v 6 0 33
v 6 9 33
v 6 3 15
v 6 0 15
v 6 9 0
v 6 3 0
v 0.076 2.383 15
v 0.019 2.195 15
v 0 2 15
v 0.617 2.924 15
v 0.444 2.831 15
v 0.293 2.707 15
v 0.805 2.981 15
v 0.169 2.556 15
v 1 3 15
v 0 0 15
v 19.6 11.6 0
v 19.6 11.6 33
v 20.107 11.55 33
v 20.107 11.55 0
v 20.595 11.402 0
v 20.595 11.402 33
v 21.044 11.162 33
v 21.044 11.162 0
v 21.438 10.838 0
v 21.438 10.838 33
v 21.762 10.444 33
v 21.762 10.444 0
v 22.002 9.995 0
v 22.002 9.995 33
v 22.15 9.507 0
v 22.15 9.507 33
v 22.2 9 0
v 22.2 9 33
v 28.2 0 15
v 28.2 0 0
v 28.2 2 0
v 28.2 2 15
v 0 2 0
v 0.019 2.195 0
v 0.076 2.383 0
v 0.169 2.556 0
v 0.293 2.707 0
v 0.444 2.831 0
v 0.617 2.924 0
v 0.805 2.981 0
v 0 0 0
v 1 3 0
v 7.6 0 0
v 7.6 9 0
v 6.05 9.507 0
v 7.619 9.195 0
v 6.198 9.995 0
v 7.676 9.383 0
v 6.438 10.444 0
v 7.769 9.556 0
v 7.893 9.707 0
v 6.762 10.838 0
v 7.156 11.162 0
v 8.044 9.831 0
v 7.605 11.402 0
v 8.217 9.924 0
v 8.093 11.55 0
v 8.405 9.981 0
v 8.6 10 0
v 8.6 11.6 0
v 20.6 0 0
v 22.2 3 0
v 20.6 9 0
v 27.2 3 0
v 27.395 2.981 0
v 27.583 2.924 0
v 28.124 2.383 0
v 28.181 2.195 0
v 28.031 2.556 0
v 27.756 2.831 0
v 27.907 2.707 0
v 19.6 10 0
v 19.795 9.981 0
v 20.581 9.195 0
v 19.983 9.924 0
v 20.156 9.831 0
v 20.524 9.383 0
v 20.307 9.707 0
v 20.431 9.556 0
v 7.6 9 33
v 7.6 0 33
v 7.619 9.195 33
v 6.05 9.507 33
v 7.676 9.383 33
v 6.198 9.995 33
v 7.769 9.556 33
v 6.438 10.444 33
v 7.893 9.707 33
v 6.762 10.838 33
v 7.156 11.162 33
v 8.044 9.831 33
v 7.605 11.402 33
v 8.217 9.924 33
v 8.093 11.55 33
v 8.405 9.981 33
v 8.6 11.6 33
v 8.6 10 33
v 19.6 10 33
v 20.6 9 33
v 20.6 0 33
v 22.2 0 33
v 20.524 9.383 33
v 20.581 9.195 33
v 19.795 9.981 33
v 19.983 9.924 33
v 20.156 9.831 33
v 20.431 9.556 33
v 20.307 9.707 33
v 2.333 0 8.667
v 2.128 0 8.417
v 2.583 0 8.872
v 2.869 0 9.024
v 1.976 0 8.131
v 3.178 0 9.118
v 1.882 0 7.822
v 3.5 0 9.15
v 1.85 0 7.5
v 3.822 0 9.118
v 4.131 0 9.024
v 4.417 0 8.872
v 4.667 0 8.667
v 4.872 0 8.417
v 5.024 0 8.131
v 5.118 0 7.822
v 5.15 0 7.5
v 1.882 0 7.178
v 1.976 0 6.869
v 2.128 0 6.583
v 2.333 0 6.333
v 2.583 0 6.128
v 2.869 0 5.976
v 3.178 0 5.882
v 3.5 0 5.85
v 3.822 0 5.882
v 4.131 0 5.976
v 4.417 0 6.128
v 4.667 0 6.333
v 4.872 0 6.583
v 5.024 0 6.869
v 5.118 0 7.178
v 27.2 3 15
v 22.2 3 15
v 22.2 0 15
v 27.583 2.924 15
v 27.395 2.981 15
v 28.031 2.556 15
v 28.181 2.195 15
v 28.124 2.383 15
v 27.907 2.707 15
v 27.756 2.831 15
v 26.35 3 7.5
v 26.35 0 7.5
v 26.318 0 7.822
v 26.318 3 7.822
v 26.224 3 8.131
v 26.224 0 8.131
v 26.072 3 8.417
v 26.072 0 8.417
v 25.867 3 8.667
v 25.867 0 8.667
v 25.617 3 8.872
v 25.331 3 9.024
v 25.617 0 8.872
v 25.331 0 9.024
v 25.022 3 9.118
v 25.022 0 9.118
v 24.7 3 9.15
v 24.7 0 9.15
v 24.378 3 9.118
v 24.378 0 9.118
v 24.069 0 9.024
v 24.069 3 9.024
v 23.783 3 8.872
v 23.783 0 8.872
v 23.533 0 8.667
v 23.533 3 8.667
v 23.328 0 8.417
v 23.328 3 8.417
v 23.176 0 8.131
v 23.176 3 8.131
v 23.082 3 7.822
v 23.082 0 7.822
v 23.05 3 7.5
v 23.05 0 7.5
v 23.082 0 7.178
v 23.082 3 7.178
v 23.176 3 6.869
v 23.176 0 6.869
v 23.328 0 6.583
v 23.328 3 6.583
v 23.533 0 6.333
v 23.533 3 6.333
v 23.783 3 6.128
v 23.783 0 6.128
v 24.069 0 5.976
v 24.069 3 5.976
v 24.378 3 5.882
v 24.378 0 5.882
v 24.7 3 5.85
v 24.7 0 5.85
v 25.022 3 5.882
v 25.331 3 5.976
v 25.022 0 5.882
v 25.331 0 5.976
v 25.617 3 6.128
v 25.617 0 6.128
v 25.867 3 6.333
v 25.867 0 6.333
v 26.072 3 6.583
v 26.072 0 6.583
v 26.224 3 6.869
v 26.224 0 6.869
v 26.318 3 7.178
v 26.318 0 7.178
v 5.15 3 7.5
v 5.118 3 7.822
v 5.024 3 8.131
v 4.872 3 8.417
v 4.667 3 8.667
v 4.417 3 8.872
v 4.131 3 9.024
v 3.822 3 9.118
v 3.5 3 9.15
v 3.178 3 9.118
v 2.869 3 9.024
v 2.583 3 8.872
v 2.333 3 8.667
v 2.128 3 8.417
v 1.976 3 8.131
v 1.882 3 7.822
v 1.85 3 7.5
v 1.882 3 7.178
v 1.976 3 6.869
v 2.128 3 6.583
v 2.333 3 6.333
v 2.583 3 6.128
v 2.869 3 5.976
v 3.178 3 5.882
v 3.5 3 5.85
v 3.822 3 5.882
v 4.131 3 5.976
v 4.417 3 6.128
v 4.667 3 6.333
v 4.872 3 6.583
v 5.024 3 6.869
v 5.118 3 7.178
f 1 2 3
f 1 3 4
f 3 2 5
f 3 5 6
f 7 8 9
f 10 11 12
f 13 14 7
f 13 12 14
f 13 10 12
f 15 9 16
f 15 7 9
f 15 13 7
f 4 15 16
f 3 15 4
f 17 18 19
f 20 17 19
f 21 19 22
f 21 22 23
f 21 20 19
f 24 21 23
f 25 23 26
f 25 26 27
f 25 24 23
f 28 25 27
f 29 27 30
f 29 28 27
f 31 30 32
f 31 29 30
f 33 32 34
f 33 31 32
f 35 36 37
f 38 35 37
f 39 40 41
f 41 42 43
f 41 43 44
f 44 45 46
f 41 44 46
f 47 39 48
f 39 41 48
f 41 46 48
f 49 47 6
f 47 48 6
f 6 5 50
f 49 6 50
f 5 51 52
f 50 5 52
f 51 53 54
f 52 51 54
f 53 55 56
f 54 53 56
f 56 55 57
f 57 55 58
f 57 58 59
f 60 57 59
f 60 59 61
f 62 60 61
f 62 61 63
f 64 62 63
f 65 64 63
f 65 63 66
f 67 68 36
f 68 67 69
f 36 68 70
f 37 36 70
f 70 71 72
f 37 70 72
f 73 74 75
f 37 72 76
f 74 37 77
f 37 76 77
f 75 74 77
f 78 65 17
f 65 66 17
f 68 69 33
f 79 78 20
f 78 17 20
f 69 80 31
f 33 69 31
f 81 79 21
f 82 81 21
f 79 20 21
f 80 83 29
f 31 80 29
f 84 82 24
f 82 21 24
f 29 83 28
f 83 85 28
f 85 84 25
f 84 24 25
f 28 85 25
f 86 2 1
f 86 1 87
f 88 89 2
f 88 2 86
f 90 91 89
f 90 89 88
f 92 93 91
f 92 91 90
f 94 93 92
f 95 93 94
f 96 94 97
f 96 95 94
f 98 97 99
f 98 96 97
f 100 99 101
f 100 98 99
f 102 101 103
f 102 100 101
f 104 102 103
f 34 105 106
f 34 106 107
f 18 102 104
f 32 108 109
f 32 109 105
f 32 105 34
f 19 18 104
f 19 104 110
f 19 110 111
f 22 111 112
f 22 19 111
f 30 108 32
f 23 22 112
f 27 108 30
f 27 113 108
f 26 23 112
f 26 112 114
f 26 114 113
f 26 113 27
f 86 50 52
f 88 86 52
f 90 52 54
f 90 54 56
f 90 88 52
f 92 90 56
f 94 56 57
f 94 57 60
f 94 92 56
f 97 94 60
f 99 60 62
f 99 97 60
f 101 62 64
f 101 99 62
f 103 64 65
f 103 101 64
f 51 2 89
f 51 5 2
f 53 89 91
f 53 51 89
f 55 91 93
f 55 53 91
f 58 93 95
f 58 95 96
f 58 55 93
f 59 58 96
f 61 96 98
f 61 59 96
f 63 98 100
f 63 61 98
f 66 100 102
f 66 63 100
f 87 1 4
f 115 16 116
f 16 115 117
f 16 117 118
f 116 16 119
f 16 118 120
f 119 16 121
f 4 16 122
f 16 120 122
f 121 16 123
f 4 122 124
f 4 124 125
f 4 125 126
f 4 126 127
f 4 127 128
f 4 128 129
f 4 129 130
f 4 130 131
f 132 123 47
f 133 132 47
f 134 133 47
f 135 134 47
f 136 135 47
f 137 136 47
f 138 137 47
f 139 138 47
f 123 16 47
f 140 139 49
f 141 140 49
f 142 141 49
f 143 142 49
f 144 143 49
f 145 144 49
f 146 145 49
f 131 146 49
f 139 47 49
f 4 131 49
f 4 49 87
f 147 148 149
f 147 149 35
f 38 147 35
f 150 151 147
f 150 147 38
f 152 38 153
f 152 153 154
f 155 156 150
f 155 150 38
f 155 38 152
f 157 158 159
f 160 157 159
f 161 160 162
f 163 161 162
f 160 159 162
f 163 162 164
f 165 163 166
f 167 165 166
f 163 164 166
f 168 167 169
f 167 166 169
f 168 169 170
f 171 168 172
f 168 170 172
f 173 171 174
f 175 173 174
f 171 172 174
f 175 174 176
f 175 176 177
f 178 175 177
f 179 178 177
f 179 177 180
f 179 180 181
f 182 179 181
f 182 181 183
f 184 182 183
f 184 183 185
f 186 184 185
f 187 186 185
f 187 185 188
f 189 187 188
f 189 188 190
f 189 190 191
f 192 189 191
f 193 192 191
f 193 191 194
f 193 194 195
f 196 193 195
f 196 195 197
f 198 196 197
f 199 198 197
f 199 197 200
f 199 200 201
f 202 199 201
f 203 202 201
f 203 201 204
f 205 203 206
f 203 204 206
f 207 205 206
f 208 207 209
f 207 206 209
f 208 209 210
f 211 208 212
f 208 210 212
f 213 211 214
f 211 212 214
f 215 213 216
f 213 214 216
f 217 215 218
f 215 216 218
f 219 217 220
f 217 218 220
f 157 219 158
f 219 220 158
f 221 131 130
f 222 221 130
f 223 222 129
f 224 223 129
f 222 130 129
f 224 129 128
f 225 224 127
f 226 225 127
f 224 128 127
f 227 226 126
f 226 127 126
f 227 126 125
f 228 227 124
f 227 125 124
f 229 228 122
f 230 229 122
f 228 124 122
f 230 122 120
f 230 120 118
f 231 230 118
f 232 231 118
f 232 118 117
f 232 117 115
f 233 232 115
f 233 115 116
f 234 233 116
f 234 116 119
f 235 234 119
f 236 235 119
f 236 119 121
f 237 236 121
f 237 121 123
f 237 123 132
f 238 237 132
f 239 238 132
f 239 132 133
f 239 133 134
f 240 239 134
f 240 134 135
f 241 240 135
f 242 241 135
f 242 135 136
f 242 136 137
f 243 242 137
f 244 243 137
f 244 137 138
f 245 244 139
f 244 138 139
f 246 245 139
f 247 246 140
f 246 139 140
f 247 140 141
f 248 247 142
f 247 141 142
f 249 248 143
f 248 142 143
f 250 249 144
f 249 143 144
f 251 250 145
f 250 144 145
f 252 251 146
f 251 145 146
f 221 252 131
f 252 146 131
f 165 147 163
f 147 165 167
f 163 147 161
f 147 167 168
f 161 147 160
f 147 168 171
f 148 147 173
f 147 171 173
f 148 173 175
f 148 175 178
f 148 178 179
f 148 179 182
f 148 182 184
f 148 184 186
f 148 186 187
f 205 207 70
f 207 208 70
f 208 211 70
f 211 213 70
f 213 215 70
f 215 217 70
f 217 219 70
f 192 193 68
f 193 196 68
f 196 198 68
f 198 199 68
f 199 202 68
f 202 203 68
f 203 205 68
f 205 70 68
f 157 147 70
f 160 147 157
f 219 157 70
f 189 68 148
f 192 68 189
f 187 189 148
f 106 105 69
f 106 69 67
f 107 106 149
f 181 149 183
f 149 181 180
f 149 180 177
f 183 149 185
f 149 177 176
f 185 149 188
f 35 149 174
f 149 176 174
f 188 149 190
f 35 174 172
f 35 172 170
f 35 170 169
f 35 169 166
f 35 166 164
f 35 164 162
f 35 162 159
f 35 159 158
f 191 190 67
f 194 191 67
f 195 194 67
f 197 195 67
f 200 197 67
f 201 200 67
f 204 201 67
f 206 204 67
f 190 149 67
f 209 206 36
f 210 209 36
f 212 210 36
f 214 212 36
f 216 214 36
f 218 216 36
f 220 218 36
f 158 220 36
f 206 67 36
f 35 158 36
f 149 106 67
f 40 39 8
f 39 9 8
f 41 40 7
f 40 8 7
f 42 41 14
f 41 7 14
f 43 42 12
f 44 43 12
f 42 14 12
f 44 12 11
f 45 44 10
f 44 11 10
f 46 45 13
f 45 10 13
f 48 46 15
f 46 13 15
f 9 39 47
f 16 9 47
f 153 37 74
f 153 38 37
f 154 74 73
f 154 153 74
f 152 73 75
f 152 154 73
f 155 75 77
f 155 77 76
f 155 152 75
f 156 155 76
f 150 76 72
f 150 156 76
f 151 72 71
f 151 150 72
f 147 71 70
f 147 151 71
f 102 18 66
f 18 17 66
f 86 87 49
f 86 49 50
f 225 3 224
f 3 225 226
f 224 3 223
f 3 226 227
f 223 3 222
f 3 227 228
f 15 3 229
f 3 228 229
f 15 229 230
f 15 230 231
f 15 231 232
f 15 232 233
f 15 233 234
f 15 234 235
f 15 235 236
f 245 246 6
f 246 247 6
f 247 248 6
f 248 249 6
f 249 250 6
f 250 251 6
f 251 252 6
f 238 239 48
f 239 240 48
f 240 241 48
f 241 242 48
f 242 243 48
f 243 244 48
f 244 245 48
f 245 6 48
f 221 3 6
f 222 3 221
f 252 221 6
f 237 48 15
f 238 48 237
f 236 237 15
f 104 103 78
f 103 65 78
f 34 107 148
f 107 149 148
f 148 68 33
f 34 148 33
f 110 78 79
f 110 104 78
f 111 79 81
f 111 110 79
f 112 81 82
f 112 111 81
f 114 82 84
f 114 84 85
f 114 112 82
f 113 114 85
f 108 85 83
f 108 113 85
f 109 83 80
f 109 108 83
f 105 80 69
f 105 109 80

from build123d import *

# Parameters (mm, degrees)
F2_DEPTH = 15
F4_DEPTH = 18
F6_D     = 3.3
F8_D     = 3.3
F9_R     = 1
F10_R    = 2.6


with BuildPart() as f2:
    # F1 (on Top) → F2 (new body)
    with BuildSketch(Plane.XY):
        Polygon((0, 3), (0, 0), (7.6, 0), (7.6, 10), (20.6, 10), (20.6, 0), (28.2, 0), (28.2, 3), (22.2, 3), (22.2, 11.6), (6, 11.6), (6, 3), align=None)
    extrude(amount=F2_DEPTH)

    # F3 (on face) → F4 (join)
    with BuildSketch(Plane.XY.offset(15)):
        Polygon((6, 0), (7.6, 0), (7.6, 10), (20.6, 10), (20.6, 0), (22.2, 0), (22.2, 3), (22.2, 11.6), (6, 11.6), (6, 3), align=None)
    extrude(amount=F4_DEPTH)

    # F6 (through all)
    with Locations(Plane(origin=(0, 3, 0), x_dir=(-1, 0, 0), z_dir=(0, 1, 0))):
        with Locations((-3.5, 7.5)):
            Hole(F6_D / 2)

    # F8 (through all)
    with Locations(Plane(origin=(0, 3, 0), x_dir=(-1, 0, 0), z_dir=(0, 1, 0))):
        with Locations((-24.7, 7.5)):
            Hole(F8_D / 2)

    # F9
    f9_edges = [f2.edges().sort_by_distance(p)[0] for p in [
        (20.6, 10, 16.5),
        (7.6, 10, 16.5),
        (28.2, 3, 7.5),
        (0, 3, 7.5),
    ]]
    fillet(f9_edges, radius=F9_R)

    # F10
    f10_edges = [f2.edges().sort_by_distance(p)[0] for p in [
        (6, 11.6, 16.5),
        (22.2, 11.6, 16.5),
    ]]
    fillet(f10_edges, radius=F10_R)


solid = f2.part
